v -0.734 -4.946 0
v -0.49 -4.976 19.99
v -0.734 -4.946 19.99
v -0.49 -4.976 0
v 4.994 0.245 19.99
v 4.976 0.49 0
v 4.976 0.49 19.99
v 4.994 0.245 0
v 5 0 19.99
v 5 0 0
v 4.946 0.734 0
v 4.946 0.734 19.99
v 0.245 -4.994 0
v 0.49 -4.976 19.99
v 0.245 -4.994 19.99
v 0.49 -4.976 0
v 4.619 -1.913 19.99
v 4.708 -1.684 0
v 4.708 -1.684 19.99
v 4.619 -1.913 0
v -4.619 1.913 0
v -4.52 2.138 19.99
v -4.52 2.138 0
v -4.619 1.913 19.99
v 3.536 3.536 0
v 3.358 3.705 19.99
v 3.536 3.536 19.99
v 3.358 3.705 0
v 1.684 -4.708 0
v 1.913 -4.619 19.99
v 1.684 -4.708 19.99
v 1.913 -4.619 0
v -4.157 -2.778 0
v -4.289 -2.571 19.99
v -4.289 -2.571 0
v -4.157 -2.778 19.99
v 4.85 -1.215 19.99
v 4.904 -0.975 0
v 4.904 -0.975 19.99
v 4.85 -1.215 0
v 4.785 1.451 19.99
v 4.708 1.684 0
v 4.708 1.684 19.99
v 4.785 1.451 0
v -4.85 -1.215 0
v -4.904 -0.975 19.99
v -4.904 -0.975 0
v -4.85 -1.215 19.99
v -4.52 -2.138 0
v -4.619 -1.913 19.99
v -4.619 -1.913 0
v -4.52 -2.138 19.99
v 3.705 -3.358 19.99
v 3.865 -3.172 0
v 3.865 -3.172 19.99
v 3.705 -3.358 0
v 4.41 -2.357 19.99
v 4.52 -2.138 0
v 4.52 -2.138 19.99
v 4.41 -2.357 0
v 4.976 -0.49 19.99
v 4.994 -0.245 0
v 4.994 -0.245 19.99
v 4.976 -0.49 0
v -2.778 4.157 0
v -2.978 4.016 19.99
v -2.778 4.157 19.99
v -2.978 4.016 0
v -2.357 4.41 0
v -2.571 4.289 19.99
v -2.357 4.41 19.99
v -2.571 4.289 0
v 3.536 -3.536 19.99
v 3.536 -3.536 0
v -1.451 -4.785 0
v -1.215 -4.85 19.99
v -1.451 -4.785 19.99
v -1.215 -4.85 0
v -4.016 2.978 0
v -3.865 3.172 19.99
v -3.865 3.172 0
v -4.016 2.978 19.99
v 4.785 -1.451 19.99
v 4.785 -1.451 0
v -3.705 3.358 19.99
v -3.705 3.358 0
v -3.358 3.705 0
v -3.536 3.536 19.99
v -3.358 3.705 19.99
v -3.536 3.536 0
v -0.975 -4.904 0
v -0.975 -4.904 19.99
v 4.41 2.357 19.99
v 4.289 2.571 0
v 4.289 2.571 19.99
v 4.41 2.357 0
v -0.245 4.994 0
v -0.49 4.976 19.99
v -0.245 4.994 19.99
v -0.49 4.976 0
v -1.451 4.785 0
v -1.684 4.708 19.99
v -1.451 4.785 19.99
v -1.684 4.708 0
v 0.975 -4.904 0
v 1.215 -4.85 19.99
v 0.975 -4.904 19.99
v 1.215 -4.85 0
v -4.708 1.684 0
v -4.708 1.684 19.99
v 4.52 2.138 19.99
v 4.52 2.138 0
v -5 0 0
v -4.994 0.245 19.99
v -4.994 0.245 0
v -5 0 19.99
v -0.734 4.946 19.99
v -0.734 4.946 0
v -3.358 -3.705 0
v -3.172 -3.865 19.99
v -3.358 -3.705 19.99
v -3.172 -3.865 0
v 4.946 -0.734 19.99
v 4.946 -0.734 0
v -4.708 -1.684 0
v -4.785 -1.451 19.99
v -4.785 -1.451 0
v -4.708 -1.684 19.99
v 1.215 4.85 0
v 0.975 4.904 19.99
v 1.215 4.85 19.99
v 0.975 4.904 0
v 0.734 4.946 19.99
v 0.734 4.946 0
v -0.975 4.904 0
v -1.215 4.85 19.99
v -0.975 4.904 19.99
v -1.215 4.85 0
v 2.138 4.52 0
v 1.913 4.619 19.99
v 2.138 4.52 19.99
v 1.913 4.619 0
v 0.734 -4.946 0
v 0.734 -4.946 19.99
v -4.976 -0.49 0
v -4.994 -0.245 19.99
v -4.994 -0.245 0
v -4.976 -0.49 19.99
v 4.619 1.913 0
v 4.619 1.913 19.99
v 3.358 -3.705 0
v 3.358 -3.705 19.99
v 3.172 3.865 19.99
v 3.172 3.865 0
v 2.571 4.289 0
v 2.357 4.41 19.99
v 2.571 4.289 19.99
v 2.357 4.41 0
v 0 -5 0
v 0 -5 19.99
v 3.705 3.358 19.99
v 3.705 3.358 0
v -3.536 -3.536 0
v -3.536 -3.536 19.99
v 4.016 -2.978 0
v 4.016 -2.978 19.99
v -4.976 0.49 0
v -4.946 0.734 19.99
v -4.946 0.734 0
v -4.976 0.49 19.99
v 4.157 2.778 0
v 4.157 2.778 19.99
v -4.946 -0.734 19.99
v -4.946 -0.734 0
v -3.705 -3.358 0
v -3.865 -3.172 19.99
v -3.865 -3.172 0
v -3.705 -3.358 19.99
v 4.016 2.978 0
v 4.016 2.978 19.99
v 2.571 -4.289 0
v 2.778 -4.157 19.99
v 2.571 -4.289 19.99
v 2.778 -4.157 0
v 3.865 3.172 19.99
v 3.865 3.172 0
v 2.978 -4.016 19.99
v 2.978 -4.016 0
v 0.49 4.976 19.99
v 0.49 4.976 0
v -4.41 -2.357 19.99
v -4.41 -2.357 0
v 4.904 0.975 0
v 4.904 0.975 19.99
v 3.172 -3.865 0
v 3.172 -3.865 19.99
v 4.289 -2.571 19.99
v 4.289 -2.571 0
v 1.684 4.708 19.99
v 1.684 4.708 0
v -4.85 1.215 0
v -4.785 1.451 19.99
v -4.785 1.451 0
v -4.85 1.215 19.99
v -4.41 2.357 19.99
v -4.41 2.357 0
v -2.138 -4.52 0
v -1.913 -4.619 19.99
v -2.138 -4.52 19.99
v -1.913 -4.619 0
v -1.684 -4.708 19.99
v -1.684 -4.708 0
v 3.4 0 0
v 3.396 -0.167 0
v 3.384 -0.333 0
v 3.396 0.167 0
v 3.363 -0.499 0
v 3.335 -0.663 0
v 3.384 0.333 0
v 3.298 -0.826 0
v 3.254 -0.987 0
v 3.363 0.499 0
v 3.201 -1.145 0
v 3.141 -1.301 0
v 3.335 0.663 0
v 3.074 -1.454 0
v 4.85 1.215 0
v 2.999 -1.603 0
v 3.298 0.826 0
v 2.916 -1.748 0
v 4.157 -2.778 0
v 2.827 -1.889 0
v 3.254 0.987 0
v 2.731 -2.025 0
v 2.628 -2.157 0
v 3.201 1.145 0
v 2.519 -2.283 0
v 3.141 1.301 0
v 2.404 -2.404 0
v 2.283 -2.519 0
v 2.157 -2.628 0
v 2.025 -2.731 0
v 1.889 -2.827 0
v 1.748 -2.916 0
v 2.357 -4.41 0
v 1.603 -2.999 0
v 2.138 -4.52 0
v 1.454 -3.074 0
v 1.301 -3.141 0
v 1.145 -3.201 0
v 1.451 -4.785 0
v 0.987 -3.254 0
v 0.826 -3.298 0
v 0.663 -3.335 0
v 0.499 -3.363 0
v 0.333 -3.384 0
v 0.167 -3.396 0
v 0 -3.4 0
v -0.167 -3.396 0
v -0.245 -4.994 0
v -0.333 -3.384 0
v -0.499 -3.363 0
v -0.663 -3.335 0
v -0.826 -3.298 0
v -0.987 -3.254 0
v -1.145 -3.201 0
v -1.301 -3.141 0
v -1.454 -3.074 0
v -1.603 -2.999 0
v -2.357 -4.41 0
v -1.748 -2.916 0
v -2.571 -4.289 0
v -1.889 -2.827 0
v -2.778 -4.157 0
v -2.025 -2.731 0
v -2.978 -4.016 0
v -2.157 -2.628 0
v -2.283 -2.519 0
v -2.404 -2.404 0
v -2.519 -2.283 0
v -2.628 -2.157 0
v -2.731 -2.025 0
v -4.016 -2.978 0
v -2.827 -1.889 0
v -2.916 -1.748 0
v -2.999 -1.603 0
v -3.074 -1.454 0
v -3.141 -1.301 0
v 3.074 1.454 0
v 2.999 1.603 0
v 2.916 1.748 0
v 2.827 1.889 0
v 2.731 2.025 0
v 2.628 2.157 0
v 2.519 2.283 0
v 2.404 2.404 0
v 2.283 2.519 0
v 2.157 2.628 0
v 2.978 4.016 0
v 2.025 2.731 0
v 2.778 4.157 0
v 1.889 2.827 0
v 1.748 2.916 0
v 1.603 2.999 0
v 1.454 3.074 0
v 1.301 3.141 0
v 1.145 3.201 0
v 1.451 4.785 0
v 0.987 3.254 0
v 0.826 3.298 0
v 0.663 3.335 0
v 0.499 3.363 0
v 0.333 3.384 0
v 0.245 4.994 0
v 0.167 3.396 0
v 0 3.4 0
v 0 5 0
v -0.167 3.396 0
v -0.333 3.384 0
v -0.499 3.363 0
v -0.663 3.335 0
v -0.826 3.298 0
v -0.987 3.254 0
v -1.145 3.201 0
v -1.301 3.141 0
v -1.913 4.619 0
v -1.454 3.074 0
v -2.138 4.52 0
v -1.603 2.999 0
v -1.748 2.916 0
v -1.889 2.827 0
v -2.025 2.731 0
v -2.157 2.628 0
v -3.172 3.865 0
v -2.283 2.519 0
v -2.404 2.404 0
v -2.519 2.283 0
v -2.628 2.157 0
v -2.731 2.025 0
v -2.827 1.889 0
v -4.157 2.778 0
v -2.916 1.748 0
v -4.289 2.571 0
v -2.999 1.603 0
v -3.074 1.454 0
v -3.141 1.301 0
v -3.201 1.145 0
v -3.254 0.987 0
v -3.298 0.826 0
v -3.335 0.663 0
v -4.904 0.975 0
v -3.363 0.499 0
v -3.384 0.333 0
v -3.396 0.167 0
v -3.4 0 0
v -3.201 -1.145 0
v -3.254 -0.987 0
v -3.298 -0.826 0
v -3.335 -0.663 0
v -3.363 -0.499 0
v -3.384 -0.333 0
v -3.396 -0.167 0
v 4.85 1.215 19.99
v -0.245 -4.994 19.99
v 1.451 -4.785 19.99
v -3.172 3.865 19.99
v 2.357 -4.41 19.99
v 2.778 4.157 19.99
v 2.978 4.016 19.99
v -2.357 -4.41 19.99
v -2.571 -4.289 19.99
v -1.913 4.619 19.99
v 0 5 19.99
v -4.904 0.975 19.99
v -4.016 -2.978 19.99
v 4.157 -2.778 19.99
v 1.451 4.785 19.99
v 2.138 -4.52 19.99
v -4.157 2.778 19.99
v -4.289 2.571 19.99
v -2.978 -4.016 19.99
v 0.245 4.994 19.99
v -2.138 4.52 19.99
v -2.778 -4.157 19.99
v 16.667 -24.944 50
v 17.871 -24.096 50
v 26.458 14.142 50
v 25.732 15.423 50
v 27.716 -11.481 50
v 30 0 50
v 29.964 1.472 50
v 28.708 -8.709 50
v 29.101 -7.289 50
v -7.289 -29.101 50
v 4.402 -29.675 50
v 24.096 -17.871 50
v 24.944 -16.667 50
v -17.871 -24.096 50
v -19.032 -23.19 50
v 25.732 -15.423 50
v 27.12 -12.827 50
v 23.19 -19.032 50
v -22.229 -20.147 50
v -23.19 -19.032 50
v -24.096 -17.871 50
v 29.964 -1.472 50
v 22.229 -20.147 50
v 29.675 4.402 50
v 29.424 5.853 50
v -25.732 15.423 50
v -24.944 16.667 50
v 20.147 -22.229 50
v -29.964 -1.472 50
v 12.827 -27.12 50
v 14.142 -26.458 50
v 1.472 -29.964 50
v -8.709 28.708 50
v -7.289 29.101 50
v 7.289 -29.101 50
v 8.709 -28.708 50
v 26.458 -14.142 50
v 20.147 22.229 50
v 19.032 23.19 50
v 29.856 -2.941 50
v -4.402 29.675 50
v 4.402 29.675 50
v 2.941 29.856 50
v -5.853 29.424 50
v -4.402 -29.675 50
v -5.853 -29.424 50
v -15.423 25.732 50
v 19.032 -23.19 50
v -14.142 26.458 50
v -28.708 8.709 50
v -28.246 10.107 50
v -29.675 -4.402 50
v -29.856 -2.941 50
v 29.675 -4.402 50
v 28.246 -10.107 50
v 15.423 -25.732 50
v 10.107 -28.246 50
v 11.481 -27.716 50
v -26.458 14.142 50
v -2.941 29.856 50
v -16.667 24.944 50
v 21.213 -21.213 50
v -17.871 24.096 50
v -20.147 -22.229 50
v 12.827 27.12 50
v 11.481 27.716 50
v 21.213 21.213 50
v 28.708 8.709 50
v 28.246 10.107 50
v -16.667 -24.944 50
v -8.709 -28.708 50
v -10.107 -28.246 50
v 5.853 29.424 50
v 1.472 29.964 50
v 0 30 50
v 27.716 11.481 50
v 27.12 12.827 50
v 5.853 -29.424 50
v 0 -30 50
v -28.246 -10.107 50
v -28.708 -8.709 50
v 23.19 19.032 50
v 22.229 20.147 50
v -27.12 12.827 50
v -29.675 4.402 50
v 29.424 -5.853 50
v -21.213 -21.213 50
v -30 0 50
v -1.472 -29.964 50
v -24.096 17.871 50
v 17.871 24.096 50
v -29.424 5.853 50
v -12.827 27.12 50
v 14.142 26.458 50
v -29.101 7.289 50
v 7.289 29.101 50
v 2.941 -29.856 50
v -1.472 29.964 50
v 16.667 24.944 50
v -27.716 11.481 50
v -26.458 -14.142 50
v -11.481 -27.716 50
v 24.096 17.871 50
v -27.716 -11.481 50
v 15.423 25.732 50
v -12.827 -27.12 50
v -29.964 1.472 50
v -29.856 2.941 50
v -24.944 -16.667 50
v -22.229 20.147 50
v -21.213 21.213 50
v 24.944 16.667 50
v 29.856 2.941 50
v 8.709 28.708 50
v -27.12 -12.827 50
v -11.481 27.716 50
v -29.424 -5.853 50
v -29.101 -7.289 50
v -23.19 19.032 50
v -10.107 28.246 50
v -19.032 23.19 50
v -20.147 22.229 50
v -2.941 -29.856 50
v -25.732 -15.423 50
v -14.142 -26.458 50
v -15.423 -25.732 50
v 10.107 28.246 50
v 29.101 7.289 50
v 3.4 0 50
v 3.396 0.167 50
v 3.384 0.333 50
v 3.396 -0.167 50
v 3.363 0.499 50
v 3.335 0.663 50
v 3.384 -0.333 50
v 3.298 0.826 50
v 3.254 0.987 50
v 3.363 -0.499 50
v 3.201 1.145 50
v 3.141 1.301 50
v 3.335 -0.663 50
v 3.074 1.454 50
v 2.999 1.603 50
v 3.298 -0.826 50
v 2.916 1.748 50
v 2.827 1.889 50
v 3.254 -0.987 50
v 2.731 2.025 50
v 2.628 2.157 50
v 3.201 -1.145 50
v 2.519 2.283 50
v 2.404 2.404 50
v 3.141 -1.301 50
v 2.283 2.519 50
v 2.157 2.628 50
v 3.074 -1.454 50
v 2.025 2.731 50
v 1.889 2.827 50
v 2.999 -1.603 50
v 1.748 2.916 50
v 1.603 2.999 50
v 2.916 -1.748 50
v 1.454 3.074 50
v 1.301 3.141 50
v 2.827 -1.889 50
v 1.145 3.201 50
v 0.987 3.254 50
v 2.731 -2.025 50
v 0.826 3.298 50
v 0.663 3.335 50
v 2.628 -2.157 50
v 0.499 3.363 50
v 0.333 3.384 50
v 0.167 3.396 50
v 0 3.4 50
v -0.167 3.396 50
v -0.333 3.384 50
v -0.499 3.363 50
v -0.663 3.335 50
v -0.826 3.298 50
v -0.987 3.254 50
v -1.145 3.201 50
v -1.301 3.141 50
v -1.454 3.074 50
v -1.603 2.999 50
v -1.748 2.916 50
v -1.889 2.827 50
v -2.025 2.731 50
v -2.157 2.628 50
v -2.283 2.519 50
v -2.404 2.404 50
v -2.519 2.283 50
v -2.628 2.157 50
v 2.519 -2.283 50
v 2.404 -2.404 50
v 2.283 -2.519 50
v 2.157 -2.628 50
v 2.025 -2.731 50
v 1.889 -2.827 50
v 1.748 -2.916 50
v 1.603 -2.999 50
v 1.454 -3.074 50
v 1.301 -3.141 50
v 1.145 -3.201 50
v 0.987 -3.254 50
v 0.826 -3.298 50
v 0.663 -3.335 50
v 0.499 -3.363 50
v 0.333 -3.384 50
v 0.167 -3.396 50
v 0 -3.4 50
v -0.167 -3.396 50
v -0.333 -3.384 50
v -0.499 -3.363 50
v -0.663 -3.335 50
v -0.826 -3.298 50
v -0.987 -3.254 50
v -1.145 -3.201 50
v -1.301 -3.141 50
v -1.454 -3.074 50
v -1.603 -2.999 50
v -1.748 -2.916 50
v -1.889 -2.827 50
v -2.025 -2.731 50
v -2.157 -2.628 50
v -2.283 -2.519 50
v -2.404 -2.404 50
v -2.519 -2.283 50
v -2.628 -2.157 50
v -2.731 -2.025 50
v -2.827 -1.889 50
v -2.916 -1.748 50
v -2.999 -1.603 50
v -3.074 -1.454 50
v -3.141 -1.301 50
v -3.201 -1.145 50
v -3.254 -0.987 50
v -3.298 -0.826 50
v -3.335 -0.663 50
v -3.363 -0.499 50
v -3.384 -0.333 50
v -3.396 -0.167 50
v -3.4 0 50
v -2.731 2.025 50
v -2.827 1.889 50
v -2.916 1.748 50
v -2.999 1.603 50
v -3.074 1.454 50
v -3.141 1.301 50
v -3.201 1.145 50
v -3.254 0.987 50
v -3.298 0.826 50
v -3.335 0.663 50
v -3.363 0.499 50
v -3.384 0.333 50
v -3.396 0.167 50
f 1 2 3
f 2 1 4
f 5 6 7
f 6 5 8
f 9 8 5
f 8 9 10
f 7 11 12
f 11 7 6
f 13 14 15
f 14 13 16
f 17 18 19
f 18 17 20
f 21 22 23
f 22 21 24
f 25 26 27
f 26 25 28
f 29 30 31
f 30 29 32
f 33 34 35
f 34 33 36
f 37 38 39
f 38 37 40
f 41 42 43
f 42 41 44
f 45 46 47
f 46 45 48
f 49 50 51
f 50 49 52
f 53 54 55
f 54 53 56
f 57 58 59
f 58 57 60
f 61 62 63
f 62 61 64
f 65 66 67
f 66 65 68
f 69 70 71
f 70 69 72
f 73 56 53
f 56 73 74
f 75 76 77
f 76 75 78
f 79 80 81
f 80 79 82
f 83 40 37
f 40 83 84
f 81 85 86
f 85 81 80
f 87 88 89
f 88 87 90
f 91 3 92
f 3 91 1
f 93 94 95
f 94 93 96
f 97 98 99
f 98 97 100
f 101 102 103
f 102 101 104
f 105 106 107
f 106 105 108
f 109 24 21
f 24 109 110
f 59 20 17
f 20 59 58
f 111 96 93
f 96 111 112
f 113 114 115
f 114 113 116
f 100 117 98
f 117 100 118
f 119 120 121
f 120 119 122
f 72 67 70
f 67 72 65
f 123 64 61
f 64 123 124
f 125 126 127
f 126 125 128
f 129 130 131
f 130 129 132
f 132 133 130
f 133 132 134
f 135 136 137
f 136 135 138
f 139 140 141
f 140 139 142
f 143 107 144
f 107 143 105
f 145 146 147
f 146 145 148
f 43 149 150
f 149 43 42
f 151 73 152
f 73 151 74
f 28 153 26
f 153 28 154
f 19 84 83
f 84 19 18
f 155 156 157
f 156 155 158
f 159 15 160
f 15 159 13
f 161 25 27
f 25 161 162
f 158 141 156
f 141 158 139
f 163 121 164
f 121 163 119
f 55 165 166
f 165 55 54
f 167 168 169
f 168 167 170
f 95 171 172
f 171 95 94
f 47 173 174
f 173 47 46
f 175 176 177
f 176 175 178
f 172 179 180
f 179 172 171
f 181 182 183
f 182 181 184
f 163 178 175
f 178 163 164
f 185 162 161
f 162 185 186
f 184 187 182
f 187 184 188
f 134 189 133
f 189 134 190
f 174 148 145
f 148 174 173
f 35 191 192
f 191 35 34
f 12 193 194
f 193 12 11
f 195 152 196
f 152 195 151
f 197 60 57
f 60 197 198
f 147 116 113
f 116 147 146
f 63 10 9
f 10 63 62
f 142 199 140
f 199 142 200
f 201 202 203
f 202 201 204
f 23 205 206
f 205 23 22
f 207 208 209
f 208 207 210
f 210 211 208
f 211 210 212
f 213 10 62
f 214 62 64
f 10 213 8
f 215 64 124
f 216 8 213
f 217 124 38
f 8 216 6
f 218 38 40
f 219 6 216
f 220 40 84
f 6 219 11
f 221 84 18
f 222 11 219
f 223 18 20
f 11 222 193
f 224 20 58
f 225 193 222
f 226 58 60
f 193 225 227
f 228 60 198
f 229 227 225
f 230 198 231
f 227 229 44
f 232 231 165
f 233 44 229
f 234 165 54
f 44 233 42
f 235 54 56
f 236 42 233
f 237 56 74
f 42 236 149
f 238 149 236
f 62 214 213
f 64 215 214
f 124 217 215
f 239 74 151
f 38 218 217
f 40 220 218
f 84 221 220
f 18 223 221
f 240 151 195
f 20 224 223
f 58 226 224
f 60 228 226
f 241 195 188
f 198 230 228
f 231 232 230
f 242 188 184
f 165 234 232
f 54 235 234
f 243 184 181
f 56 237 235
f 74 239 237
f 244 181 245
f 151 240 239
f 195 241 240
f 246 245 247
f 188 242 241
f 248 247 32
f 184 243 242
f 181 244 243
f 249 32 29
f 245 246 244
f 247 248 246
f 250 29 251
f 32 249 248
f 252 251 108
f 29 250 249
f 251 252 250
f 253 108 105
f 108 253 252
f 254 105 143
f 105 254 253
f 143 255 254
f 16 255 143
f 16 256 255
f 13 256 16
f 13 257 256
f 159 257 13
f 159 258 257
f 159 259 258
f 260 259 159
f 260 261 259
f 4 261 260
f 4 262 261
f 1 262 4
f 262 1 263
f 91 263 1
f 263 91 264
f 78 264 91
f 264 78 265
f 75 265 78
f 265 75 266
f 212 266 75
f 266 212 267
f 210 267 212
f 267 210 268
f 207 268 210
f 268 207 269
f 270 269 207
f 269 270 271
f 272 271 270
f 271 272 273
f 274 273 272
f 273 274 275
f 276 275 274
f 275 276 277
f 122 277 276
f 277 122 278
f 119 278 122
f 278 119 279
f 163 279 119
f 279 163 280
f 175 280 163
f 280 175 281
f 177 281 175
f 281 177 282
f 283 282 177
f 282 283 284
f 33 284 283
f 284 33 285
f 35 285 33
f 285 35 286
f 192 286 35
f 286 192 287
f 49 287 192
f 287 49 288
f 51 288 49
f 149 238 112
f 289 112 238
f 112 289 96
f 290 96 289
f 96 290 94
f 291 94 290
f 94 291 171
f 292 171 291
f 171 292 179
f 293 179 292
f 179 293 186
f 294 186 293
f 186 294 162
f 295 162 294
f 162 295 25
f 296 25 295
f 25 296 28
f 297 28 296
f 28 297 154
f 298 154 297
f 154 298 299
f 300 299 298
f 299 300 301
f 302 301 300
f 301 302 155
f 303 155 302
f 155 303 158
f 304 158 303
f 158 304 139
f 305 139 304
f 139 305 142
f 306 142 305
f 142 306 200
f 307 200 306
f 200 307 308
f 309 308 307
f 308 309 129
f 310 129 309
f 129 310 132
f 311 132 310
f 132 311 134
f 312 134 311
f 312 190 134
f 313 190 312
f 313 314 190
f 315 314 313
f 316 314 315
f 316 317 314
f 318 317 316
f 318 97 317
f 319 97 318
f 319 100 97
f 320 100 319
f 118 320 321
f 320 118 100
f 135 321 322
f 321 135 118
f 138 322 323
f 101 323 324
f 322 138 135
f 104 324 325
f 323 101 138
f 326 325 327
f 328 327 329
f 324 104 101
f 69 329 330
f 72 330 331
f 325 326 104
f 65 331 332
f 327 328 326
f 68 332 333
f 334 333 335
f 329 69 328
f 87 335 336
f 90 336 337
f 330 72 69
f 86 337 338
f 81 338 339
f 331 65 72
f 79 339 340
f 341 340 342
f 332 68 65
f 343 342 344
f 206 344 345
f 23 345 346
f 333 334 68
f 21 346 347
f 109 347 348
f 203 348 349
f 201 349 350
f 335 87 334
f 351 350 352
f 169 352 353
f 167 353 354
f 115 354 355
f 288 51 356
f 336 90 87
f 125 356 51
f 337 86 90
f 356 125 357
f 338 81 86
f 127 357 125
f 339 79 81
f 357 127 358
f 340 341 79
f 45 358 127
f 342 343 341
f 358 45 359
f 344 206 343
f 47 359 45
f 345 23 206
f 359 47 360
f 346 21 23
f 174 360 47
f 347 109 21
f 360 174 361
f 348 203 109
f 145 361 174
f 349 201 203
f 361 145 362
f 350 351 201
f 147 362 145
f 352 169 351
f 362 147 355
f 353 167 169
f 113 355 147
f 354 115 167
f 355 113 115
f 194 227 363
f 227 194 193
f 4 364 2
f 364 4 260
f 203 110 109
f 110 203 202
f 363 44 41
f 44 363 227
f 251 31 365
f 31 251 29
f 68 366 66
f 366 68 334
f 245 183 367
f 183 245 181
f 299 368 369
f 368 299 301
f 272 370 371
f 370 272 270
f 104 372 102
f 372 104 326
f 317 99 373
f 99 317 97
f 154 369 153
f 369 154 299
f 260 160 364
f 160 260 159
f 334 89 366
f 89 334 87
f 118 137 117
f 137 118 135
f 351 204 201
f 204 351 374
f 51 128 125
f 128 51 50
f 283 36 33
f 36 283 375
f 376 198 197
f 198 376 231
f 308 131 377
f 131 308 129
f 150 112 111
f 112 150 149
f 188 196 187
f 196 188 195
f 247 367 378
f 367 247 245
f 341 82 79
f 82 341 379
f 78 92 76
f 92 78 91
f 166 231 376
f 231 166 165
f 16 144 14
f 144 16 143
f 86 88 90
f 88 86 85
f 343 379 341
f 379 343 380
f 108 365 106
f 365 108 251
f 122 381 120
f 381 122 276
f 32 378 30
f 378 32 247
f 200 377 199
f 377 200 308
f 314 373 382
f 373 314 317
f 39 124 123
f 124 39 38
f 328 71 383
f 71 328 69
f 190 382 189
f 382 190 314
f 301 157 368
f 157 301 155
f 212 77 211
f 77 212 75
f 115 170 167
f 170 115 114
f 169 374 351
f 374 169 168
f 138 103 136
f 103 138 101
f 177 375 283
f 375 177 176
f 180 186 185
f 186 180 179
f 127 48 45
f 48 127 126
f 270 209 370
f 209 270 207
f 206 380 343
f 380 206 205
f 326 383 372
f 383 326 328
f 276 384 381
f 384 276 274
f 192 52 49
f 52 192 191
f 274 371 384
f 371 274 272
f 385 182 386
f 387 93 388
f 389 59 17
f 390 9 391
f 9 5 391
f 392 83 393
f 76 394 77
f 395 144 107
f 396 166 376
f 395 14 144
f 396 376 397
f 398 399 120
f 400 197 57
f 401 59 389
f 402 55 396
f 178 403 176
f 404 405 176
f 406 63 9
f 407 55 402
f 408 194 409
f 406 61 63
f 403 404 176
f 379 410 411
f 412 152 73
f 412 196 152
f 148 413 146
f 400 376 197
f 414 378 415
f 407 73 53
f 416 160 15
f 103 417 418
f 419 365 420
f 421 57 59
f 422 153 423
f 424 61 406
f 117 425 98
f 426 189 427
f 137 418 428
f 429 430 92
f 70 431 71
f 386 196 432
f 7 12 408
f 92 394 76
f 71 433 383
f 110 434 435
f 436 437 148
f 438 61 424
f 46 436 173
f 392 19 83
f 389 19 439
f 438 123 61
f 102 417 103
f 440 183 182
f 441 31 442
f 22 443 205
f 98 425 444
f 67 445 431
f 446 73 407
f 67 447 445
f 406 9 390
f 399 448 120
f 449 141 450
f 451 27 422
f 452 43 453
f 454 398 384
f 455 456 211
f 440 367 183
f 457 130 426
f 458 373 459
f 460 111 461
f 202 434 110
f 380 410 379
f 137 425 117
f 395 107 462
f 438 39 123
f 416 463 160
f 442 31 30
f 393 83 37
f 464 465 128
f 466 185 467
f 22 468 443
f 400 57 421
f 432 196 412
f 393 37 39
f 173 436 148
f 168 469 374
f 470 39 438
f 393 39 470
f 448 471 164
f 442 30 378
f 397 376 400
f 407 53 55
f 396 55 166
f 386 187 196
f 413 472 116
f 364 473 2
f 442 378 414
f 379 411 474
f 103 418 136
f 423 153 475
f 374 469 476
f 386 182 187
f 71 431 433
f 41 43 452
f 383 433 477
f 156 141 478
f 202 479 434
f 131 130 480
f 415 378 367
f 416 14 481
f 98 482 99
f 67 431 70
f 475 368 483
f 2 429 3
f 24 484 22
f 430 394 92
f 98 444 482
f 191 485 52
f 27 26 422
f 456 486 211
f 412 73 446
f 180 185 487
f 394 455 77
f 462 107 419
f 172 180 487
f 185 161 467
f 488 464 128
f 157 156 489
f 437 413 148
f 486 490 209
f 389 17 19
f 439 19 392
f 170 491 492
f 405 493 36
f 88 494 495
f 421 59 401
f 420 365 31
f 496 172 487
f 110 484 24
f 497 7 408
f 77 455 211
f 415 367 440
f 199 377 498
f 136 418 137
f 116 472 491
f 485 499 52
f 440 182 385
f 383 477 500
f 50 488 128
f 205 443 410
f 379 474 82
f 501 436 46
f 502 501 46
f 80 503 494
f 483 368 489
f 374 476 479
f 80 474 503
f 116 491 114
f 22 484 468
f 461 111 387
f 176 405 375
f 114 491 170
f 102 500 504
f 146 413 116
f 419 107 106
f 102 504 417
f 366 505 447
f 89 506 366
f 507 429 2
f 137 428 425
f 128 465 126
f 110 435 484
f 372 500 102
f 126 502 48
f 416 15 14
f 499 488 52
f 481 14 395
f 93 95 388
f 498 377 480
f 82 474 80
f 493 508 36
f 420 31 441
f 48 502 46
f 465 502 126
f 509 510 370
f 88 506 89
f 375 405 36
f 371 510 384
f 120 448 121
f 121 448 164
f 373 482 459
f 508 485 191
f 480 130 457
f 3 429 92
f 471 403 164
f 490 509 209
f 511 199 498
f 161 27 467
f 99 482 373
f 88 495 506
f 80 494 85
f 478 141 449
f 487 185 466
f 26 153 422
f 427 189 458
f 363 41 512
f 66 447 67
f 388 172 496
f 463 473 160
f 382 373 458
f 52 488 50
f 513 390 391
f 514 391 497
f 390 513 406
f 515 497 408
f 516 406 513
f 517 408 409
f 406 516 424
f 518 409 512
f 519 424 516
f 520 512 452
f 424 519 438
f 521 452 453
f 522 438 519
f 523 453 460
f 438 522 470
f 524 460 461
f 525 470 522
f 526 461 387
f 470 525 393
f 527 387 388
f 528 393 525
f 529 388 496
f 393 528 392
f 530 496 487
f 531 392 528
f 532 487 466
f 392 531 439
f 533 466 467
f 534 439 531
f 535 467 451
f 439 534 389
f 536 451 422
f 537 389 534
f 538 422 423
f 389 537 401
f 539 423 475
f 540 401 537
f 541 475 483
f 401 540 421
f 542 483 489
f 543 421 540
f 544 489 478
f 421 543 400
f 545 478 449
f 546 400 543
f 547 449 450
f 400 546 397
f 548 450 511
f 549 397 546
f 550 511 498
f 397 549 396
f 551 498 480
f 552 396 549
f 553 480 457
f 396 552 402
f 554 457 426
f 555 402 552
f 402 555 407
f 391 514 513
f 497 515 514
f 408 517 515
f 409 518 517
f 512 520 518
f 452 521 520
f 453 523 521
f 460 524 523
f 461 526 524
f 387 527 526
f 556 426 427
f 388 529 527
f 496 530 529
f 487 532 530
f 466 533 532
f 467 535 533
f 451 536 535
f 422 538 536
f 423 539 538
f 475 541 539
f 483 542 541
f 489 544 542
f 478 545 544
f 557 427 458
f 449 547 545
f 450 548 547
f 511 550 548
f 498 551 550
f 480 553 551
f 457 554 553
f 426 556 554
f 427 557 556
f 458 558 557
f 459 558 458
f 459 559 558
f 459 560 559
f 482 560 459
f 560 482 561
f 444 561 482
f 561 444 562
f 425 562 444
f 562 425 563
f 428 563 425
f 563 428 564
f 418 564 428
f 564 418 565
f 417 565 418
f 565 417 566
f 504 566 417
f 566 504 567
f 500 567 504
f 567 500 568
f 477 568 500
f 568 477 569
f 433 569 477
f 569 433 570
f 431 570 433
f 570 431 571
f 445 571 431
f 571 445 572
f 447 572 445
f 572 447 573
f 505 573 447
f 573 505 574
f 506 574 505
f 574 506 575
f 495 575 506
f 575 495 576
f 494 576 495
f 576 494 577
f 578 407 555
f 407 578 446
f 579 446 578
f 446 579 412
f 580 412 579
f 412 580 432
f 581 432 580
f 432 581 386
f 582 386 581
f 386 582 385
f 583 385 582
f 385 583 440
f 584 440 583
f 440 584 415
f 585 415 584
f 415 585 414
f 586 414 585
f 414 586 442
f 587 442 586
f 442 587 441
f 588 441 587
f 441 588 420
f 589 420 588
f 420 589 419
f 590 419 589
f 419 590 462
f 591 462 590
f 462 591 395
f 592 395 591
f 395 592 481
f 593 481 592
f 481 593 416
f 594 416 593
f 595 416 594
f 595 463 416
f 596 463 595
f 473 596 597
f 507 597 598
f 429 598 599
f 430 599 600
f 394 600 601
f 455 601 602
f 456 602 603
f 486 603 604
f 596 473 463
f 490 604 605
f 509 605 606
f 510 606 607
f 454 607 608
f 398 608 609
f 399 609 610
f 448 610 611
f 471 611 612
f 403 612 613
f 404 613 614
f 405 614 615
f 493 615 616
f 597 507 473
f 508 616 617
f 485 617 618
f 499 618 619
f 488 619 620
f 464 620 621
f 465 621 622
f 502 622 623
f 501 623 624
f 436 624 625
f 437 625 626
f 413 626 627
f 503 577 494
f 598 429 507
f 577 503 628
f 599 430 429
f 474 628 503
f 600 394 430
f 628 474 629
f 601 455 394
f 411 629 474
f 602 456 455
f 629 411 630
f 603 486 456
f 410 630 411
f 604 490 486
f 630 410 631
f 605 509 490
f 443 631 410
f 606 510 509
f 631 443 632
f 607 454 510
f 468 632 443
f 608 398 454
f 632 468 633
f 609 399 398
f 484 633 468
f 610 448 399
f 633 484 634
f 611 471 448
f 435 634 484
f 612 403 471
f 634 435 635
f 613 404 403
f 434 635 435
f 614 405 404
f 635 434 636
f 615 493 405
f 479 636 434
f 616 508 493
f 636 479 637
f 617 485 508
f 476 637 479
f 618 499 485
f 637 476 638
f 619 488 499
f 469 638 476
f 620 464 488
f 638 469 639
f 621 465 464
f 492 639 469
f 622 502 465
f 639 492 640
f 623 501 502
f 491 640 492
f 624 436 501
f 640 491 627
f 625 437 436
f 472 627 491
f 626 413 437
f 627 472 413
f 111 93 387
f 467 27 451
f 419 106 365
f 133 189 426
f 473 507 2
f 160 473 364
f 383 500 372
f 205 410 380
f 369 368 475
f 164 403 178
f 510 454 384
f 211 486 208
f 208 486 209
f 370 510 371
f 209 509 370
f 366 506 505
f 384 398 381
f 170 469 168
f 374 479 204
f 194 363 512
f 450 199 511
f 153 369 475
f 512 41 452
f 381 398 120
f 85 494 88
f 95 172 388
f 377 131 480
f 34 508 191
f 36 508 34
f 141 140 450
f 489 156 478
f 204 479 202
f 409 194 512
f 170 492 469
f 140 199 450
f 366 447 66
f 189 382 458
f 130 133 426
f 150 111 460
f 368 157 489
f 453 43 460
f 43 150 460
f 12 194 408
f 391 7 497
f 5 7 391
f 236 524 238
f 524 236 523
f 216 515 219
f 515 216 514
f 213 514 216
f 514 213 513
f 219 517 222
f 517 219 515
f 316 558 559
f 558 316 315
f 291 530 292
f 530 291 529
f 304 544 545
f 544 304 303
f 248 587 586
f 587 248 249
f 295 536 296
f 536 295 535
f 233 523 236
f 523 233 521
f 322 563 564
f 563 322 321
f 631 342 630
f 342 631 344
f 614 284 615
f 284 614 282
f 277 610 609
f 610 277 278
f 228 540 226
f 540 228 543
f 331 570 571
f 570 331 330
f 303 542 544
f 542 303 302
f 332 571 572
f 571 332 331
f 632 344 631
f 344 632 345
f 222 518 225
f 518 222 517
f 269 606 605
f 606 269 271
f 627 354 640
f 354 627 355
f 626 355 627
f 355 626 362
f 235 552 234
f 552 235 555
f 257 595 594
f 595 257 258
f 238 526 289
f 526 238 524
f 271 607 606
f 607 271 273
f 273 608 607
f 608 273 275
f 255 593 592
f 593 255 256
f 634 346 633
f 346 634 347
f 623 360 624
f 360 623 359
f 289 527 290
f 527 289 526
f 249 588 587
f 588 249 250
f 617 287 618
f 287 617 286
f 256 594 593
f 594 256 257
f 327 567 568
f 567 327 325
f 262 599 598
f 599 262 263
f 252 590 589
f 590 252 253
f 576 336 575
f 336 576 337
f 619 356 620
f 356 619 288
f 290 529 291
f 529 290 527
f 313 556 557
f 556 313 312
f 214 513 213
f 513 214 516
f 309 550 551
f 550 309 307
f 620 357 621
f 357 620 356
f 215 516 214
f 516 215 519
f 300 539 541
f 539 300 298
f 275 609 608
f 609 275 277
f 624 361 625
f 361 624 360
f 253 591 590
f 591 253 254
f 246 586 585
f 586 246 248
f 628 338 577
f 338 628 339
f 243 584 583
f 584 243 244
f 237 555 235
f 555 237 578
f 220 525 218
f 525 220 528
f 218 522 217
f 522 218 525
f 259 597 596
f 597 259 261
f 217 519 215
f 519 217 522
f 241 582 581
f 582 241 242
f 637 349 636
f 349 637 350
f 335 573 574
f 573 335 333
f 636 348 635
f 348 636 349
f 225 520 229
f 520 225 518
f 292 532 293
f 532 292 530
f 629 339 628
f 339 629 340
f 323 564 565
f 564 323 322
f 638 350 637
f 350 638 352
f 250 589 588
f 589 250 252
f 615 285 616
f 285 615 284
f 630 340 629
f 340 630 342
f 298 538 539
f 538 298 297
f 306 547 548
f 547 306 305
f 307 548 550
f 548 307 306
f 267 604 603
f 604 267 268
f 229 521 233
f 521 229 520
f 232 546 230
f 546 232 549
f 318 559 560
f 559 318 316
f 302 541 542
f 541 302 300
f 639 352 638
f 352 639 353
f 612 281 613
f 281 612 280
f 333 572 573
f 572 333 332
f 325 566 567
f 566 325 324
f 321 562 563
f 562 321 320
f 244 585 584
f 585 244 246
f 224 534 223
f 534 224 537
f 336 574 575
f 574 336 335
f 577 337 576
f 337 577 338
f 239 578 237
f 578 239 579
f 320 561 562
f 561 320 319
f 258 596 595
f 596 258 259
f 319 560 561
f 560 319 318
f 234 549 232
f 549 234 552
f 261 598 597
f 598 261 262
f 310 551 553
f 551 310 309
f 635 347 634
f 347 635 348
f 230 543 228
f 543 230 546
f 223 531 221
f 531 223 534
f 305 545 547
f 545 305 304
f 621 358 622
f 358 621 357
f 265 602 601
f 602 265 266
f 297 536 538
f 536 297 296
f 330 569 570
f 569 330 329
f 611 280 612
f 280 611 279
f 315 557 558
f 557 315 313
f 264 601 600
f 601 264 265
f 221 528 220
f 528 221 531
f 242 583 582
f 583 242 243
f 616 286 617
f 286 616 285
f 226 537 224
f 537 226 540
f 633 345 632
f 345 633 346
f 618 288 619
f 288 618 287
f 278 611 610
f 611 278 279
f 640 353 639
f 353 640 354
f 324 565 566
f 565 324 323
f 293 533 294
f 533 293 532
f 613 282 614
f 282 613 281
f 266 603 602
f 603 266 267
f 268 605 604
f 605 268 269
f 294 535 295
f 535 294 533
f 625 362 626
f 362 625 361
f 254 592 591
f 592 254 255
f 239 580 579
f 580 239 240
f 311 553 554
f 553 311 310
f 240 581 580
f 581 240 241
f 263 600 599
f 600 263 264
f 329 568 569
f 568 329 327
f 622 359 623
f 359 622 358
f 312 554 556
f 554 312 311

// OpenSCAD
// Small lab funnel, printed upright: spout at the bottom (z = 0), cone on top.
// All dimensions in mm.

// ---- Parameters ----
spout_od      = 10;    // spout outer diameter
spout_h       = 20;    // spout height (z = 0 to 20)
cone_od_top   = 60;    // cone outer diameter at rim
cone_h        = 30;    // cone height (z = 20 to 50)
wall          = 1.6;   // wall thickness everywhere
eps           = 0.5;   // overshoot for clean boolean cuts

$fn = 128;

// ---- Derived ----
bore = spout_od - 2 * wall;   // spout bore = 6.8 mm

// ---- Model ----
difference() {
    union() {
        // Spout
        cylinder(h = spout_h, d = spout_od);
        // Cone (slightly overlapping spout to fuse solids)
        translate([0, 0, spout_h - 0.01])
            cylinder(h = cone_h + 0.01, d1 = spout_od, d2 = cone_od_top);
    }
    // Through-bore: starts below z = 0, runs through spout and cone
    translate([0, 0, -eps])
        cylinder(h = spout_h + cone_h + 2 * eps, d = bore);
}
